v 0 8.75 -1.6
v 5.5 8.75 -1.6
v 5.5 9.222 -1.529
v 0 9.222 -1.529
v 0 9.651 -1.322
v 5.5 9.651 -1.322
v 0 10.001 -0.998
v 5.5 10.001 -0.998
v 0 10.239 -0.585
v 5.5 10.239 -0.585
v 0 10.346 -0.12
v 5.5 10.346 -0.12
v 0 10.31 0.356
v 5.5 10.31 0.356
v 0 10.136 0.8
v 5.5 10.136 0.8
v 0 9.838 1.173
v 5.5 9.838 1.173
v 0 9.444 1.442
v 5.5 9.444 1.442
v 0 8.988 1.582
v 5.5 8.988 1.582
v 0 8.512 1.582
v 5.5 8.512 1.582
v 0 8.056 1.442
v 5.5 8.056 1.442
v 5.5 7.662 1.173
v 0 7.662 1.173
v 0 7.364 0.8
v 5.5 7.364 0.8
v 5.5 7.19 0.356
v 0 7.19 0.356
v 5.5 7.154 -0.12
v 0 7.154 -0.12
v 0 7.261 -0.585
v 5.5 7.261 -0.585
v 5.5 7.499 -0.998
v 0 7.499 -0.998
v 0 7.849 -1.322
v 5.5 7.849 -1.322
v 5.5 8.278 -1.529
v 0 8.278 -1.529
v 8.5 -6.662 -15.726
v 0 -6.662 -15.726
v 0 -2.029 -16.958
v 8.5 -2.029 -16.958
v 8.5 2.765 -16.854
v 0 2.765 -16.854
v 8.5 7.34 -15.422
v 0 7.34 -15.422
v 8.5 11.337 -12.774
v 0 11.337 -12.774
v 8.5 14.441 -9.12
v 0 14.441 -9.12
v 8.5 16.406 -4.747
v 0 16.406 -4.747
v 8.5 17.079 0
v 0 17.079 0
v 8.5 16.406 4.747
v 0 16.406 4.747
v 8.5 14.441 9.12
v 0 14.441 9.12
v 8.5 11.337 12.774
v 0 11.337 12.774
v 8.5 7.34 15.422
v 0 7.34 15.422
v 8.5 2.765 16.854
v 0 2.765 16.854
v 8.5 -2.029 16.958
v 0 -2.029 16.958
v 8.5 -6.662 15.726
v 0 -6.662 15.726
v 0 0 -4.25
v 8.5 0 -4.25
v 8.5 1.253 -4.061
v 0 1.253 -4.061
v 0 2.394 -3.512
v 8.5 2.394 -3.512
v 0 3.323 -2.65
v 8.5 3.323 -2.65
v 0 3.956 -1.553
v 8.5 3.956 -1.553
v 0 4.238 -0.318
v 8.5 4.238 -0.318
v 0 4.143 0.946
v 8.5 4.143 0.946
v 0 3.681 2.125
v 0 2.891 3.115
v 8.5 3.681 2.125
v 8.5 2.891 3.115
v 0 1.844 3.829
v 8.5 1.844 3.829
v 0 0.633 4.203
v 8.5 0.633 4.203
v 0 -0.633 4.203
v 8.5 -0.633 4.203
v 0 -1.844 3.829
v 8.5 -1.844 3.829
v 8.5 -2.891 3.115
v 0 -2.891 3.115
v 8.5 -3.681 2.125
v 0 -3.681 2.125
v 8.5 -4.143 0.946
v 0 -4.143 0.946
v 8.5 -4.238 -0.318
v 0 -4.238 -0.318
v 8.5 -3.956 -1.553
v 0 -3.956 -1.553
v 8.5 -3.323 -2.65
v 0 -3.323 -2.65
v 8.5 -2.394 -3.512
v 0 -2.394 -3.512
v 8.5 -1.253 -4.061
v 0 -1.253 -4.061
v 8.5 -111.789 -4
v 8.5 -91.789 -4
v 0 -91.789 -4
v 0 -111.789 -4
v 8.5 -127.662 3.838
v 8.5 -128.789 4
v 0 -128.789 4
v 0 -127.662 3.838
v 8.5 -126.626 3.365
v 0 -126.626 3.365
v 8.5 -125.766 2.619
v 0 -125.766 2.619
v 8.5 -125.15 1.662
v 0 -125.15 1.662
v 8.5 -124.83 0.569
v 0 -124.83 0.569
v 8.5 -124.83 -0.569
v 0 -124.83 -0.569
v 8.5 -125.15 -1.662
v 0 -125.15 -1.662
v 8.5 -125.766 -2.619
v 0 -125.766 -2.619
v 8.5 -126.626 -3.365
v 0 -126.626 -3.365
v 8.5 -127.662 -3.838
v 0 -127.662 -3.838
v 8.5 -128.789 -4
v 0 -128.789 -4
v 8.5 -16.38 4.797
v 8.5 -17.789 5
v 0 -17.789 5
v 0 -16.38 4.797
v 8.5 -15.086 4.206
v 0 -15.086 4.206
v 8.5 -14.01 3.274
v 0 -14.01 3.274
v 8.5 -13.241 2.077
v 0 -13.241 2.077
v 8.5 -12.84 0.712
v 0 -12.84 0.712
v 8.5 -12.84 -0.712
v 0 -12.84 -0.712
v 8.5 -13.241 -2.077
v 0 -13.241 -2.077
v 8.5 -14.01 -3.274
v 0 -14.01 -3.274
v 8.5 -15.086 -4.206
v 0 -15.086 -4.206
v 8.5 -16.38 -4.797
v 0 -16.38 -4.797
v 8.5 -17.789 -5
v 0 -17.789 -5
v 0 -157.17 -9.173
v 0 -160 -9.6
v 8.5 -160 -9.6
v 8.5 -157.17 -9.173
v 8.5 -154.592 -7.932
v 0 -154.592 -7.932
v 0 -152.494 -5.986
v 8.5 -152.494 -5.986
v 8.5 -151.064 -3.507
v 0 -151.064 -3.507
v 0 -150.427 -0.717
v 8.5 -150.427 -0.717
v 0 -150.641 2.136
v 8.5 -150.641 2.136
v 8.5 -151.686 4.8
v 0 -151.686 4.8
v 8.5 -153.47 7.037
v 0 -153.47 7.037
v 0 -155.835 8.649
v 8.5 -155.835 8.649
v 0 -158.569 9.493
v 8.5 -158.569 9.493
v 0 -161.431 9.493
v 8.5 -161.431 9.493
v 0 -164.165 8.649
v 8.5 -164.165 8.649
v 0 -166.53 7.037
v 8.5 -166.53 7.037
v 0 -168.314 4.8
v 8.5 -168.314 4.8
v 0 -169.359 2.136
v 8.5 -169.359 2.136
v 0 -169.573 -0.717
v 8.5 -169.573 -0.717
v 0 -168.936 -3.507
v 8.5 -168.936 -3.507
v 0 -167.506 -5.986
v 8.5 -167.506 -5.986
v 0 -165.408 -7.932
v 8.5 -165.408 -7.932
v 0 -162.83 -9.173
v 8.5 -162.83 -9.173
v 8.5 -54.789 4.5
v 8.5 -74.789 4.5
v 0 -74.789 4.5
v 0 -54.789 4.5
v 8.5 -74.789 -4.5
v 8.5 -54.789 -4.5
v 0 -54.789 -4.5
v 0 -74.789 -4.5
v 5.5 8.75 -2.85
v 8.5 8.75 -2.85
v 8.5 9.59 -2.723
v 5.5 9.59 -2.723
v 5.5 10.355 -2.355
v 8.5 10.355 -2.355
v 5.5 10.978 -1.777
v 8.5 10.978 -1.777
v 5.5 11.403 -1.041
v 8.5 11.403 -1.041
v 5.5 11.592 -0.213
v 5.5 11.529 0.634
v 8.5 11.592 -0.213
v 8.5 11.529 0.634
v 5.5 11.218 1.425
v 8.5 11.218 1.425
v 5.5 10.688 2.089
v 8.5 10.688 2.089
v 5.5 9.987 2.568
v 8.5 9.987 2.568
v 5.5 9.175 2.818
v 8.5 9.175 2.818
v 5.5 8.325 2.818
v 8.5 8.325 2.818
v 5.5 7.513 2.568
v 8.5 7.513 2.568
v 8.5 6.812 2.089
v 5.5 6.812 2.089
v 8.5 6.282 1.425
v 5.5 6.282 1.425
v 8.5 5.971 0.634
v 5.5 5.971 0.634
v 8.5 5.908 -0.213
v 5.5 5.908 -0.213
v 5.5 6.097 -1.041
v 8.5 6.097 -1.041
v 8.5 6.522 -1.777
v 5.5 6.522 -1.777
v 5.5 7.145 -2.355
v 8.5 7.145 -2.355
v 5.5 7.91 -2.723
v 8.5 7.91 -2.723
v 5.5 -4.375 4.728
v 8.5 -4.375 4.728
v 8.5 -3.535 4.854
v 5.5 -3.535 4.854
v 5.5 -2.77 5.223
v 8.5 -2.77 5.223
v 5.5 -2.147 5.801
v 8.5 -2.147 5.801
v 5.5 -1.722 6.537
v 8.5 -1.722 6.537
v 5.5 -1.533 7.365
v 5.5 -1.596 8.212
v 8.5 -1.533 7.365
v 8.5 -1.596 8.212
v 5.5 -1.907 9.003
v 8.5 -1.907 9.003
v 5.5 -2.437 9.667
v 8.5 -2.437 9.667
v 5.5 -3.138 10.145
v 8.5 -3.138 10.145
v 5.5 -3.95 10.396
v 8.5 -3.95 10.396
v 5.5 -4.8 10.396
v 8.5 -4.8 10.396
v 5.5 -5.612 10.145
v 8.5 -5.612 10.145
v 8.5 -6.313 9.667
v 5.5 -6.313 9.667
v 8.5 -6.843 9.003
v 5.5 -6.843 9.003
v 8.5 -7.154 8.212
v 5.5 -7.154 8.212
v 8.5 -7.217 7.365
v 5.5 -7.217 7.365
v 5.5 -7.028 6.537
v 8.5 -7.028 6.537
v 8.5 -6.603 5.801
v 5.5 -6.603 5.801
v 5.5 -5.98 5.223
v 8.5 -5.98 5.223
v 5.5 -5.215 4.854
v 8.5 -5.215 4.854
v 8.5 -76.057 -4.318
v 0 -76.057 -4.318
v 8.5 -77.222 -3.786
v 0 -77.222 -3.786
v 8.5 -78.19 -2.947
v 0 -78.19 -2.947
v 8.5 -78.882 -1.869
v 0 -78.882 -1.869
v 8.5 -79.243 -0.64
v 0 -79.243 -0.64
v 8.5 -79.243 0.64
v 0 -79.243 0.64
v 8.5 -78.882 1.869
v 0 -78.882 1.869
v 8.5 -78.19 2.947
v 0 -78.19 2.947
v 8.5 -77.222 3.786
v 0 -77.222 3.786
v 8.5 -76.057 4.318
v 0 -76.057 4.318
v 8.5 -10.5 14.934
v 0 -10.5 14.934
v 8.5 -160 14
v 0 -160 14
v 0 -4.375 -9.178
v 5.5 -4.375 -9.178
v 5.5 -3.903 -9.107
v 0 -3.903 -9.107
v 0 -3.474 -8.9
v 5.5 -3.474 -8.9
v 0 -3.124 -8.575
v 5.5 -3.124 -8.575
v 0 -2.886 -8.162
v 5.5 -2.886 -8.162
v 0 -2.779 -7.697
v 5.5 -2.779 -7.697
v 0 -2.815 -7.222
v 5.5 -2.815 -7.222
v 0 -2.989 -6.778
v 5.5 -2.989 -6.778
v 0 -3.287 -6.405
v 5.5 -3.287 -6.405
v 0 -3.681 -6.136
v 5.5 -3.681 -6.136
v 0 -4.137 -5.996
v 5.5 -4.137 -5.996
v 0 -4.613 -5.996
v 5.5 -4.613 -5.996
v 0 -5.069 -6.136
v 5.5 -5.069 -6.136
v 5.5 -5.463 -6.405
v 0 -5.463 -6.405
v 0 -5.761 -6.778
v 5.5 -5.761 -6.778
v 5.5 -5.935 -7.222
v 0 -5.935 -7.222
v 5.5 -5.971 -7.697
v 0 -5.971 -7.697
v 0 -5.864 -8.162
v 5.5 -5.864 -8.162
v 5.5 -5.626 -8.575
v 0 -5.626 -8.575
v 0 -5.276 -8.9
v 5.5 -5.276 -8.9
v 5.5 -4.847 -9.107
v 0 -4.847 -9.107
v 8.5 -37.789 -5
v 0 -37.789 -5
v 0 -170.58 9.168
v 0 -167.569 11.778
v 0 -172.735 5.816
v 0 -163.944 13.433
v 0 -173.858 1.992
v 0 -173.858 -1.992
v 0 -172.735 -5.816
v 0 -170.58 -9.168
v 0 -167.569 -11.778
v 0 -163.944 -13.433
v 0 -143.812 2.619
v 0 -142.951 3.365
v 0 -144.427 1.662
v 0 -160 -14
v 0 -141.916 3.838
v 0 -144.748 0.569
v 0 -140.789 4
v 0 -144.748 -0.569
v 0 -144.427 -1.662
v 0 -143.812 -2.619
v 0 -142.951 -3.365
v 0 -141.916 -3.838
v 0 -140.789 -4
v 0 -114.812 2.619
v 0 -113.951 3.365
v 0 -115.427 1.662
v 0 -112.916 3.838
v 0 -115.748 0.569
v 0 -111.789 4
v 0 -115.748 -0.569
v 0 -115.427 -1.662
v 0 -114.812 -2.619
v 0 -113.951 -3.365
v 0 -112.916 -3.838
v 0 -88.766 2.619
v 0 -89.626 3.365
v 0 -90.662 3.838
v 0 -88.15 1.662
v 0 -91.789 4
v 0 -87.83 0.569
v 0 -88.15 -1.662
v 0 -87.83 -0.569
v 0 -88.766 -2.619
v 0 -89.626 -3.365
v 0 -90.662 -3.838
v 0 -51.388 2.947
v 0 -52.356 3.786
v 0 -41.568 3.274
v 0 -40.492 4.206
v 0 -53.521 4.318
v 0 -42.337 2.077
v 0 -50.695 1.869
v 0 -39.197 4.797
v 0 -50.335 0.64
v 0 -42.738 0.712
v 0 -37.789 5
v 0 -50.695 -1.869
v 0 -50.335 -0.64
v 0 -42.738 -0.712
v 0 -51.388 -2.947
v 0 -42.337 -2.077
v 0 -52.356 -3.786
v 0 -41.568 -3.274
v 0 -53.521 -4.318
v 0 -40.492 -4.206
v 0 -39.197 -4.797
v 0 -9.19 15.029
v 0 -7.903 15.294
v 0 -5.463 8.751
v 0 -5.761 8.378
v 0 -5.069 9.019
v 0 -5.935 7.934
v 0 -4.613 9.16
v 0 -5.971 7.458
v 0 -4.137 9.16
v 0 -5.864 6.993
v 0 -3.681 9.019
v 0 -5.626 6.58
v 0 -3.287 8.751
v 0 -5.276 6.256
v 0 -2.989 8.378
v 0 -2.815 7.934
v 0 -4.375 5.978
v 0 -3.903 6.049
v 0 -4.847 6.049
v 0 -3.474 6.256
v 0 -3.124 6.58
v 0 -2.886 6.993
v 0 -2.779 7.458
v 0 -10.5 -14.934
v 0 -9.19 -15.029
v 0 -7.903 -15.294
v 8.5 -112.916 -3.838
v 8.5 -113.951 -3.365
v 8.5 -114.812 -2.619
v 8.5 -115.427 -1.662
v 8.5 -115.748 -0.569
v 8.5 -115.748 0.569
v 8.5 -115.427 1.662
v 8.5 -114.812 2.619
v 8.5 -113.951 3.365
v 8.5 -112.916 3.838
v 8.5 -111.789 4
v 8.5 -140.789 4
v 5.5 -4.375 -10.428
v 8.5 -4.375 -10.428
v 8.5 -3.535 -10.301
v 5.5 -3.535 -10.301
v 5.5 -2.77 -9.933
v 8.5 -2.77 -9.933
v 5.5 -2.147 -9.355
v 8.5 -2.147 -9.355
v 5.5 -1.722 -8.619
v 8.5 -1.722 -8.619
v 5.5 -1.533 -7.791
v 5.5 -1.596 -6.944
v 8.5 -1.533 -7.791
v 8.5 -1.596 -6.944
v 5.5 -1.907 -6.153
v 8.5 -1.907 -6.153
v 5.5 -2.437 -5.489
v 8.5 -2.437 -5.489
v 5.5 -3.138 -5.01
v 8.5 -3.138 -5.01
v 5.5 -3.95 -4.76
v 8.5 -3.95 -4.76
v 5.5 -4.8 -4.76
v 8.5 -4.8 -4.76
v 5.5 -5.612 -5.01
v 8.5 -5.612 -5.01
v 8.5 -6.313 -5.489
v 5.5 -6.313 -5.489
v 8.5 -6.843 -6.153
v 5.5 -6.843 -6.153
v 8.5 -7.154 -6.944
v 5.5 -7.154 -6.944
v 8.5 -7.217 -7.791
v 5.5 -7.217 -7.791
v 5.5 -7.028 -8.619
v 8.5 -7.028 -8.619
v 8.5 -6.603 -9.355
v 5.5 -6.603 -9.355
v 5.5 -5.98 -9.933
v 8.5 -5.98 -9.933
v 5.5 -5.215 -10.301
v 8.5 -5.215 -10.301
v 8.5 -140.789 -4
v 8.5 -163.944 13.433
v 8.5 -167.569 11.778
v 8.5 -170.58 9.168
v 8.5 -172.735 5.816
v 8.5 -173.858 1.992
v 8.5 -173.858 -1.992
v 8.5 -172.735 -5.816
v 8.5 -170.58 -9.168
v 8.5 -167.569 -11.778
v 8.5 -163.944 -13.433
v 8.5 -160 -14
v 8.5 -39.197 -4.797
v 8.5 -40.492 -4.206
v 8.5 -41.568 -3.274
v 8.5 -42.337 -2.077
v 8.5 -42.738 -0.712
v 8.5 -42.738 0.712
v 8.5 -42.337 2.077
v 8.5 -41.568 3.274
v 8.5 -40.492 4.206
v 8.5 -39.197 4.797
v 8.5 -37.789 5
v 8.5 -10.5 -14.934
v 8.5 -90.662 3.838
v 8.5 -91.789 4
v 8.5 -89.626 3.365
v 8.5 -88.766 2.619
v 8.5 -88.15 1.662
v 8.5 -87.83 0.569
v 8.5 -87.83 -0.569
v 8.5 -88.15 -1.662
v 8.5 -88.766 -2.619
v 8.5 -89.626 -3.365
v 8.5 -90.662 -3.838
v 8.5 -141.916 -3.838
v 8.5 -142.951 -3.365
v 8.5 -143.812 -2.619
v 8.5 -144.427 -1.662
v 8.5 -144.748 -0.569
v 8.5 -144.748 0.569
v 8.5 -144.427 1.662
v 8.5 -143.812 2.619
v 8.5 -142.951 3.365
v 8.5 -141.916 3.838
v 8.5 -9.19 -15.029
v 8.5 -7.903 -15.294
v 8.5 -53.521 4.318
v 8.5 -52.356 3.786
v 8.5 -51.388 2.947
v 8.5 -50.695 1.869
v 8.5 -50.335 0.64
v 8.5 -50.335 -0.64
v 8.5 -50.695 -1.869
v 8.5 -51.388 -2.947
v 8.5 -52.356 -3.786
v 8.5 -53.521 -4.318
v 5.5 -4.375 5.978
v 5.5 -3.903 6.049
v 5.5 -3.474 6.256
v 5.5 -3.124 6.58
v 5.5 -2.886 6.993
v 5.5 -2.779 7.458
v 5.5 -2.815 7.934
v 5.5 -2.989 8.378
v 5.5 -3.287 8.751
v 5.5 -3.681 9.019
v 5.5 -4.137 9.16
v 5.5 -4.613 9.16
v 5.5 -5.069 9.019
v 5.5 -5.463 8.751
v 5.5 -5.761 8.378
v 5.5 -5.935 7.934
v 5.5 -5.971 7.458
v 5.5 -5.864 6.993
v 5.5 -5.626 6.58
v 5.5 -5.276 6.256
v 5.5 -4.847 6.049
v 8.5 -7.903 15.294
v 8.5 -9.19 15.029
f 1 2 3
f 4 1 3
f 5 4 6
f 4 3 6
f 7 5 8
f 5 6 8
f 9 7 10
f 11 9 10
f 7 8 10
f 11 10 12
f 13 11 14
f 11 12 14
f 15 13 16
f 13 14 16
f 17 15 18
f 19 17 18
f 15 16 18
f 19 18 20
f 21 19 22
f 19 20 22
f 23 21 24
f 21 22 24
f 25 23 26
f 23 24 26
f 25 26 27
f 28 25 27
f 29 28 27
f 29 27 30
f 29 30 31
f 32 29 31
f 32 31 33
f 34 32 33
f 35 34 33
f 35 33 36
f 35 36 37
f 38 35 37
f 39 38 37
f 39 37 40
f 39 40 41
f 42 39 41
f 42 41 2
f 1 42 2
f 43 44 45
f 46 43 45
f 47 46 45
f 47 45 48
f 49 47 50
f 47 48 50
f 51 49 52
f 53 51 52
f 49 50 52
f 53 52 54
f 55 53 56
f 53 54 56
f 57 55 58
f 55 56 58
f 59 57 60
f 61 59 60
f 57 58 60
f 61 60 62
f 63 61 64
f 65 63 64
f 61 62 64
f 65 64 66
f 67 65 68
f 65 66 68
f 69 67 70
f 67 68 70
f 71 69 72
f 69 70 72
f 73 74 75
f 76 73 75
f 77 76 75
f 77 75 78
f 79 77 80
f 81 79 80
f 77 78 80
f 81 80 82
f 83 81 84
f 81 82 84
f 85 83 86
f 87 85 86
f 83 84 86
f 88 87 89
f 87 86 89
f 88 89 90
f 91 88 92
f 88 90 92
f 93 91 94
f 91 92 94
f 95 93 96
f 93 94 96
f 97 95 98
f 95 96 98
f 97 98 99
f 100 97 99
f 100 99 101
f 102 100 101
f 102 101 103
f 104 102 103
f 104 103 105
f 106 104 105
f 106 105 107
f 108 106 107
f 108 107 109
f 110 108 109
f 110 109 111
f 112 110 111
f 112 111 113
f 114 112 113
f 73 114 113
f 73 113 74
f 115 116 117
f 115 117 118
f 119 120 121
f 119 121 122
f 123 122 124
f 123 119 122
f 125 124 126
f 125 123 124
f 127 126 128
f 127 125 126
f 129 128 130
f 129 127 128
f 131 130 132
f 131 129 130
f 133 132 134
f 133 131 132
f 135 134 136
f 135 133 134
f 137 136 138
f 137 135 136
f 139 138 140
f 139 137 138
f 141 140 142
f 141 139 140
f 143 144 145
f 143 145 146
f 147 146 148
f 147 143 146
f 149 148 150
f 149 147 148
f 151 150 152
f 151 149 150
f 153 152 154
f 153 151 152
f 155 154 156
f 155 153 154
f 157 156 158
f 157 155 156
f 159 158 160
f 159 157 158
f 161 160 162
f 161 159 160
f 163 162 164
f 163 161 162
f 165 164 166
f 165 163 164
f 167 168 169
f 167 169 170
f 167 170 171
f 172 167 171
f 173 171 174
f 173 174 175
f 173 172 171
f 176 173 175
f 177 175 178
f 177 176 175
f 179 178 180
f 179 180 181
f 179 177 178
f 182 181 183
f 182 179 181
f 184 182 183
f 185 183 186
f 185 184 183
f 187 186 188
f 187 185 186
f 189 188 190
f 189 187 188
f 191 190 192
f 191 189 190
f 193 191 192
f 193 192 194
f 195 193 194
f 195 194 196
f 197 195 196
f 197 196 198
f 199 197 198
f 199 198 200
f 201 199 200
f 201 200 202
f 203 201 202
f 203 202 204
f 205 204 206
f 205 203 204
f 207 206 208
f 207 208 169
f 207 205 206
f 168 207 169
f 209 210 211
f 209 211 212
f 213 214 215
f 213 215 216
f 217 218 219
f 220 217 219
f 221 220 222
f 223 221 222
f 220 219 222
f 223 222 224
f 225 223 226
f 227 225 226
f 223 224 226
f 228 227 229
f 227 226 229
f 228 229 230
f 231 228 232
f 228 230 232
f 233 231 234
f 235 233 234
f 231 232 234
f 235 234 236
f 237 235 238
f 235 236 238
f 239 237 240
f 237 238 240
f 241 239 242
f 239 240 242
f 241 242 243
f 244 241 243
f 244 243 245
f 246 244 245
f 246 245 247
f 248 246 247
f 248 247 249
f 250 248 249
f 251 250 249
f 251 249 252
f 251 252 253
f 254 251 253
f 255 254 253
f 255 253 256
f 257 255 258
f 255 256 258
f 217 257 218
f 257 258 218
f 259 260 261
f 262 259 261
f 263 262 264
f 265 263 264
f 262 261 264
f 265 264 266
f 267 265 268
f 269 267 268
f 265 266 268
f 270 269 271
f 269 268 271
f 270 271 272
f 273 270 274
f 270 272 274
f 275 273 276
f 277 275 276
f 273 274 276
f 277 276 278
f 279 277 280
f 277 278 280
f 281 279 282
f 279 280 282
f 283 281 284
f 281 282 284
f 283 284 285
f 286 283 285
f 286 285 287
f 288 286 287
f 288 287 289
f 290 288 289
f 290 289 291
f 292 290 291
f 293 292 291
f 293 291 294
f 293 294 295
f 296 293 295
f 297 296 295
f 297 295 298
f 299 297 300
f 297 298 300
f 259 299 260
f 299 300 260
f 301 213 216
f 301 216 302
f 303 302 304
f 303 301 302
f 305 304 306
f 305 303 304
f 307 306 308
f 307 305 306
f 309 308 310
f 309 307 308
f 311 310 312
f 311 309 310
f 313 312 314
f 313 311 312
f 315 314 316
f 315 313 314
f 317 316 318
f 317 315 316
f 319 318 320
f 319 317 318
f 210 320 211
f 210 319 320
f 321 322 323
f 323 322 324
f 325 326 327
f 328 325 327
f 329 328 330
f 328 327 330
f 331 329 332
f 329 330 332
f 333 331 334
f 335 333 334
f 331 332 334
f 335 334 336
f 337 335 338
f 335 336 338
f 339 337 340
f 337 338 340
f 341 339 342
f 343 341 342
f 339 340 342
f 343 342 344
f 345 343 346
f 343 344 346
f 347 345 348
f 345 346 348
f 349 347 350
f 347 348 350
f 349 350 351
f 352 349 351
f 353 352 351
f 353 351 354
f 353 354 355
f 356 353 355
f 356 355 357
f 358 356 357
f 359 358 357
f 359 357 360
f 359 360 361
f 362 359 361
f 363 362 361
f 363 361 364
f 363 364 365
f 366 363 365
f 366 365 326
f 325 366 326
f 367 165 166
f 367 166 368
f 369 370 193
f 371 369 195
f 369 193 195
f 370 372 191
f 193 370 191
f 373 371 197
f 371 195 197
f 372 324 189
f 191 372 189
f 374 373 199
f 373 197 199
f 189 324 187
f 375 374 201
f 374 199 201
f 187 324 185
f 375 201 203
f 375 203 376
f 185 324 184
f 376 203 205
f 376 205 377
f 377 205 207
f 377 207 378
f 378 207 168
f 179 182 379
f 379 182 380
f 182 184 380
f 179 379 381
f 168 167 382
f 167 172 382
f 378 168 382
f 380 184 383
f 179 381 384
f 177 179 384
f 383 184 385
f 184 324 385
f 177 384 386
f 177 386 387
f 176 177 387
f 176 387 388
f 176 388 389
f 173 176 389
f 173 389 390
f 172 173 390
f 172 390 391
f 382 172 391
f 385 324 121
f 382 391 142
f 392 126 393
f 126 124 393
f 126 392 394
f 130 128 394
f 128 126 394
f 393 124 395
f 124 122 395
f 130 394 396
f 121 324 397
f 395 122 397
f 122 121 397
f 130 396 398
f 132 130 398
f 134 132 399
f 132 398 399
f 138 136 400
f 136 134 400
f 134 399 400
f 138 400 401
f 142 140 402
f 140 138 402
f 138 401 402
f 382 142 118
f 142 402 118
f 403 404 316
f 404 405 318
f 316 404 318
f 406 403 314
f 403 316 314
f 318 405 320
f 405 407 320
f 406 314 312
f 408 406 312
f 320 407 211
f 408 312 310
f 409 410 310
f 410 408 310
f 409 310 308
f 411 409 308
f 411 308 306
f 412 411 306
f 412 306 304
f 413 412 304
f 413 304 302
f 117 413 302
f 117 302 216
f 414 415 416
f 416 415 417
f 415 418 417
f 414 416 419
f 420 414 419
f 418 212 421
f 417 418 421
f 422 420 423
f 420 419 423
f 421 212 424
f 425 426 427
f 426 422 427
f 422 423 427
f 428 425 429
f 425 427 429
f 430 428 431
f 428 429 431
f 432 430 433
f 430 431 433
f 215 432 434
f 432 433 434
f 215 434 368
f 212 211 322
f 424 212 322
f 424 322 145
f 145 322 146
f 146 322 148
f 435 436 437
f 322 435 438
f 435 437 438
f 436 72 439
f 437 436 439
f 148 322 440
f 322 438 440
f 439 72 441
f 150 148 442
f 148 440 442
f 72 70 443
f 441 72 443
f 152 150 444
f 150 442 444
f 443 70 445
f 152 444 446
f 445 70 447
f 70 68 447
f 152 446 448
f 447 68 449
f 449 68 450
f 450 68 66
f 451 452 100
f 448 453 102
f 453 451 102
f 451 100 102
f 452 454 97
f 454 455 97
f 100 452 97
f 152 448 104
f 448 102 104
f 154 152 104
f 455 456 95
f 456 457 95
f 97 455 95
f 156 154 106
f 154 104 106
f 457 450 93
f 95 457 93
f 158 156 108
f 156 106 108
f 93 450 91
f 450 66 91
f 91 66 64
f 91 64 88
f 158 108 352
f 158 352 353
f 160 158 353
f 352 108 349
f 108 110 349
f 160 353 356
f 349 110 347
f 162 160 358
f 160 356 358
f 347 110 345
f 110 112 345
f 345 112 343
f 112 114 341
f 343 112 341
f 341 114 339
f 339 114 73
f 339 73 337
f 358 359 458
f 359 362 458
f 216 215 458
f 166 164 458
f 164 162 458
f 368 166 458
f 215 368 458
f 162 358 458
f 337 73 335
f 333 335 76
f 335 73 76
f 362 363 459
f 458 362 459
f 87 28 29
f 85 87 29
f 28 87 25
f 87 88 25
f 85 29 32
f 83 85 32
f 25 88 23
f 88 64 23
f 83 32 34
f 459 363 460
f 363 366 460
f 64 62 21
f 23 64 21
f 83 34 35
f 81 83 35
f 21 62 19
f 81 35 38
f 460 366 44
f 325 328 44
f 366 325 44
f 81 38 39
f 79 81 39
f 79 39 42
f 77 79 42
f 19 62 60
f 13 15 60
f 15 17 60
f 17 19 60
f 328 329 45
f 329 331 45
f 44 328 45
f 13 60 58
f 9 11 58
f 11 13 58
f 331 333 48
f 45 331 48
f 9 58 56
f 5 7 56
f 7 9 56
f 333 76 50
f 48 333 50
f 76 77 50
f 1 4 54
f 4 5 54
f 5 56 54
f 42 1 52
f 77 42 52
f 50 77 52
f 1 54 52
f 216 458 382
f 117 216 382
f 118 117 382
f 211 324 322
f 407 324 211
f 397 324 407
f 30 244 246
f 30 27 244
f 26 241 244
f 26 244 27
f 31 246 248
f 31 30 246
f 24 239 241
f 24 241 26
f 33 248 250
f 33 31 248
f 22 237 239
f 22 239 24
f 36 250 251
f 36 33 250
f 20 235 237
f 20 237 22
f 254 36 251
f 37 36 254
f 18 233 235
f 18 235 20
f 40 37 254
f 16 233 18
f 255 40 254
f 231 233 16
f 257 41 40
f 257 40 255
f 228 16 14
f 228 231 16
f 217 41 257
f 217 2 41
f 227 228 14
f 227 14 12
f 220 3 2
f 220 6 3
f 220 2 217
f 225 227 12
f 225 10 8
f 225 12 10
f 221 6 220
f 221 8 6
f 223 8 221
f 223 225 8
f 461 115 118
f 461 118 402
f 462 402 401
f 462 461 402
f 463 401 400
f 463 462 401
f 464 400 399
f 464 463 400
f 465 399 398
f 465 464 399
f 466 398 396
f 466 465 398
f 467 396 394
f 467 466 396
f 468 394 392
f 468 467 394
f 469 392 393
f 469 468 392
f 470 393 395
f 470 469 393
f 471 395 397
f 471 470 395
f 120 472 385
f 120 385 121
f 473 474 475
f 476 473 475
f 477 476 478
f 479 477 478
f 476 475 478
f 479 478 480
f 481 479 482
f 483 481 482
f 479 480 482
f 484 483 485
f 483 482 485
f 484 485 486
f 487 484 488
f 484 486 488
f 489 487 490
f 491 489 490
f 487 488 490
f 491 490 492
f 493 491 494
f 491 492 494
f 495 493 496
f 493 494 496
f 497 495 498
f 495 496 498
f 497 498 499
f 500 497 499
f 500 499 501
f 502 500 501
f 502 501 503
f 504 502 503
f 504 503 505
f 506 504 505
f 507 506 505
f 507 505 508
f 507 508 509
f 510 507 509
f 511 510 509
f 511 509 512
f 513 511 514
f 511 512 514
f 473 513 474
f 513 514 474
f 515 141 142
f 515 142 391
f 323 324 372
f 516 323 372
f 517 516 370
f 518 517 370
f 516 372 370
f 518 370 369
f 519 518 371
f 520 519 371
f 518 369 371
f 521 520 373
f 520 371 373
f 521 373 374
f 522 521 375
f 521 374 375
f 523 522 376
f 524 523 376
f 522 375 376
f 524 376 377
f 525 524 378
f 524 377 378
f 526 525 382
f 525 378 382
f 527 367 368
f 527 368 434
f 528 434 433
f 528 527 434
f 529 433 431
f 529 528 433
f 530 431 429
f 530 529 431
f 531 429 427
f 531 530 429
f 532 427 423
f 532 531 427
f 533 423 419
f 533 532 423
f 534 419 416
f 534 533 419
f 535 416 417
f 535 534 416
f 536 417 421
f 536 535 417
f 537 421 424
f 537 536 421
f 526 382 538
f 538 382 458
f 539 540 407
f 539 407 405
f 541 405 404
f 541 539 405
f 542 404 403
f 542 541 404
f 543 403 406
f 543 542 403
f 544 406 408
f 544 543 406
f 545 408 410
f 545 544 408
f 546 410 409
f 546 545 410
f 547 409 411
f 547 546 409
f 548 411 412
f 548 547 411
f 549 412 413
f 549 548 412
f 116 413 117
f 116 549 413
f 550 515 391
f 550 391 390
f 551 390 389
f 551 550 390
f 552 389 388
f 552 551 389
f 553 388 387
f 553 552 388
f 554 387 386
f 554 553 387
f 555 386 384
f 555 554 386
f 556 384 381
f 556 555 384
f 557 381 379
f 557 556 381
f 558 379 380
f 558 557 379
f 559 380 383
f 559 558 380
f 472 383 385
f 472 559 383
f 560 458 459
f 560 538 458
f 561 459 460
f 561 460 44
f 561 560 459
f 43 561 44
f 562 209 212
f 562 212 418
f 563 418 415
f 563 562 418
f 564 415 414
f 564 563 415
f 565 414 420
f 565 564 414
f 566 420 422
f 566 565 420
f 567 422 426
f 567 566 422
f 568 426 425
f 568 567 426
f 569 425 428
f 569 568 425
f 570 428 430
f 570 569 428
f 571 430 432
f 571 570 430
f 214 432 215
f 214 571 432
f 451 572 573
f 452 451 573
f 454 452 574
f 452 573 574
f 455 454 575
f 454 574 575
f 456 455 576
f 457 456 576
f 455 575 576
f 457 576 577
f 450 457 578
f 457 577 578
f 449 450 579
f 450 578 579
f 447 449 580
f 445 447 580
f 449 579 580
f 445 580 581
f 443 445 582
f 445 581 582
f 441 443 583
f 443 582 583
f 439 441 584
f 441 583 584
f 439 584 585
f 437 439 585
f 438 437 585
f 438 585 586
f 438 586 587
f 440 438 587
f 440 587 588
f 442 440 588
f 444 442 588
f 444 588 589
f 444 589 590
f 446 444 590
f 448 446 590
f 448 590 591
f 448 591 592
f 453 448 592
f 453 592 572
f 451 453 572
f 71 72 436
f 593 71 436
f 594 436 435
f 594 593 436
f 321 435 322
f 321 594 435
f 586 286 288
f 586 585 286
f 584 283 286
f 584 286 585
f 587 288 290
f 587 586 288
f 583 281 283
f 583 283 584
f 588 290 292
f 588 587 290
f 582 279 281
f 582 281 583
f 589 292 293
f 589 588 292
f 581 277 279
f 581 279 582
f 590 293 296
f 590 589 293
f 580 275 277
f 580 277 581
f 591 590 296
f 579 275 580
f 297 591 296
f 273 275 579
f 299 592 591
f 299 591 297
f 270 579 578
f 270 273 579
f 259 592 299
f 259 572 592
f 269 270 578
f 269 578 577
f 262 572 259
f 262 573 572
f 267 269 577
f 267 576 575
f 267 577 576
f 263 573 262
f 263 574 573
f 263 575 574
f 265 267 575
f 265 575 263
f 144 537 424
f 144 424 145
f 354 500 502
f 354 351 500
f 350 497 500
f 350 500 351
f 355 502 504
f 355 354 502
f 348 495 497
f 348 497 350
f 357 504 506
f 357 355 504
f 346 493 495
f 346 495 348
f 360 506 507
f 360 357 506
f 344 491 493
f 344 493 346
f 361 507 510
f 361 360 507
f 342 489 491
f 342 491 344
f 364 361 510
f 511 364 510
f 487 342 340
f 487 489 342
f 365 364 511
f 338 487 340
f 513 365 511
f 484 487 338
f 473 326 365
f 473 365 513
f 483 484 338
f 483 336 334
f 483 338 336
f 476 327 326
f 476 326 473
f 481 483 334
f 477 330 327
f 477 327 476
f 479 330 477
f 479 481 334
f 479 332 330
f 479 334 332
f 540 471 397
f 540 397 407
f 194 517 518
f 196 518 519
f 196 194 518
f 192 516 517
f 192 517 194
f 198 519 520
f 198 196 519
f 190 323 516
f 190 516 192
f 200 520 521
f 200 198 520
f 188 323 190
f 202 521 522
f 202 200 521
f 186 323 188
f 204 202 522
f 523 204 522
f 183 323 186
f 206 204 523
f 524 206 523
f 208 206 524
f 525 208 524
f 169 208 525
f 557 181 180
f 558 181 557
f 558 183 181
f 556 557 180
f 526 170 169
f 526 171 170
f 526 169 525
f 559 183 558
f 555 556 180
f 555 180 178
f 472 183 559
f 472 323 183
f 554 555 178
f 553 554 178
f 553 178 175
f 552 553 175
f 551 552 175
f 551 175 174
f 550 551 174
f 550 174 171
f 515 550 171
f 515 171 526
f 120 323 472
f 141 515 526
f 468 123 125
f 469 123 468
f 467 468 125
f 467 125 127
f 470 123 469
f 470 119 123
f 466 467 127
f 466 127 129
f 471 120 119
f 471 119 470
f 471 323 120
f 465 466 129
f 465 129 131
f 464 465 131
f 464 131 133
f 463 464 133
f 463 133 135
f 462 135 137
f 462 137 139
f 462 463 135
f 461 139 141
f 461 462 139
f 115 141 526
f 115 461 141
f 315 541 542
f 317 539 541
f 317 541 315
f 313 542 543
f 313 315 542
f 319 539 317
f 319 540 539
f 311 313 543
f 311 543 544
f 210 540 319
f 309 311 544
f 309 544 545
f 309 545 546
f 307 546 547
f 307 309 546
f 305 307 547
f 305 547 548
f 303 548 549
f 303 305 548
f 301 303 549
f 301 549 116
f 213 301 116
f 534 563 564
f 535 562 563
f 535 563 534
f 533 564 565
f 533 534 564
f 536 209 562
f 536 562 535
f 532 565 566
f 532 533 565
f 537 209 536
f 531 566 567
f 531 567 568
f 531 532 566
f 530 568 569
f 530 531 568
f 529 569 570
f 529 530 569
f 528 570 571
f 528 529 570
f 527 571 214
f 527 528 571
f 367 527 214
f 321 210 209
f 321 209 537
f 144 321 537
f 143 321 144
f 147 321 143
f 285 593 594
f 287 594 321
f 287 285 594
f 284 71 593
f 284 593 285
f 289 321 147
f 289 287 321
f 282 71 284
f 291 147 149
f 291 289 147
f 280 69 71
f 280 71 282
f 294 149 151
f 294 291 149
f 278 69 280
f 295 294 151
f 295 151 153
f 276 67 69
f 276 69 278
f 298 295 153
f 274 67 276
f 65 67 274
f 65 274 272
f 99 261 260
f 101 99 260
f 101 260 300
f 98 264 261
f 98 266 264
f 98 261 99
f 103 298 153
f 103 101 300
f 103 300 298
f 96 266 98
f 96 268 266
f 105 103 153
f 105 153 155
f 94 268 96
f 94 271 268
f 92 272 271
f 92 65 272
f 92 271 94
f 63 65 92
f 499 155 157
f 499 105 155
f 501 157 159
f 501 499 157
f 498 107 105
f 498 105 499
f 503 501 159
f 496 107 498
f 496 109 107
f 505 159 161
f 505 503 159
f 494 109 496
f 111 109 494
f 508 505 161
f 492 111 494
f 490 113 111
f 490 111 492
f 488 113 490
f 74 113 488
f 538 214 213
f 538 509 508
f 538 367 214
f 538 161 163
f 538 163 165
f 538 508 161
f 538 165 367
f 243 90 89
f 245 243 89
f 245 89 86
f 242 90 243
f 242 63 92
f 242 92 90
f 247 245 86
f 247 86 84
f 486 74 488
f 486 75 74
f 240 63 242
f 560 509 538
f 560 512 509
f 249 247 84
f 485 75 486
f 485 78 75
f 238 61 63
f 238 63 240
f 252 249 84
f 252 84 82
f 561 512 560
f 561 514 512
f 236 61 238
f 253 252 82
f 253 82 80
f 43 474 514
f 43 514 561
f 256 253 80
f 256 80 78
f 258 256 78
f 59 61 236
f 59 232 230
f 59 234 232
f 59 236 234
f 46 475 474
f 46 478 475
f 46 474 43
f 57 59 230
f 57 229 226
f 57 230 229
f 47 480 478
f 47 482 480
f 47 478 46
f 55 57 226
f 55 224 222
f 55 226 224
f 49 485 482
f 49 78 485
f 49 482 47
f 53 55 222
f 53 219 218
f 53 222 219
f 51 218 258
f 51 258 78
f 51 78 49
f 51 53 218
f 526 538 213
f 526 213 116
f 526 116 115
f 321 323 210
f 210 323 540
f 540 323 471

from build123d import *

# Parameters (mm, degrees)
SKETCH_3_R          = 9.6
EXTRUDE_1_DEPTH     = 8.5
SKETCH_4_R          = 4.25
SKETCH_4_R_2        = 1.6
CUT_EXTRUDE_1_DEPTH = 10
SKETCH_5_R          = 2.85
CUT_EXTRUDE_2_DEPTH = 3
CUT_EXTRUDE_3_DEPTH = 10
FILLET_1_R          = 10


with BuildPart() as part:
    # 草图3 → 凸台-拉伸1 (new body)
    with BuildSketch(Plane(origin=(0, 0, 0), x_dir=(0, 0, -1), z_dir=(1, 0, 0))):
        with BuildLine():
            Line((14, -160), (14.948368861, -8.260982254))
            ThreePointArc((14.948368861, -8.260982254), (0, 17.0791557), (-14.948368861, -8.260982254))
            Line((-14.948368861, -8.260982254), (-14, -160))
            ThreePointArc((-14, -160), (0, -174), (14, -160))
        make_face()
        with Locations((0, -160)):
            Circle(SKETCH_3_R, mode=Mode.SUBTRACT)
    extrude(amount=EXTRUDE_1_DEPTH)

    # 草图4 → 切除-拉伸1 (cut)
    with BuildSketch(Plane(origin=(8.5, 0, 0), x_dir=(0, 0, -1), z_dir=(1, 0, 0))):
        Circle(SKETCH_4_R)
        with Locations((0, 8.75)):
            Circle(SKETCH_4_R_2)
        with Locations((7.577722283, -4.375)):
            Circle(SKETCH_4_R_2)
        with Locations((-7.577722283, -4.375)):
            Circle(SKETCH_4_R_2)
    extrude(amount=-CUT_EXTRUDE_1_DEPTH, mode=Mode.SUBTRACT)

    # 草图5 → 切除-拉伸2 (cut)
    with BuildSketch(Plane(origin=(8.5, 0, 0), x_dir=(0, 0, -1), z_dir=(1, 0, 0))):
        with Locations((0, 8.75)):
            Circle(SKETCH_5_R)
        with Locations((7.577722283, -4.375)):
            Circle(SKETCH_5_R)
        with Locations((-7.577722283, -4.375)):
            Circle(SKETCH_5_R)
    extrude(amount=-CUT_EXTRUDE_2_DEPTH, mode=Mode.SUBTRACT)

    # 草图6 → 切除-拉伸3 (cut)
    with BuildSketch(Plane(origin=(8.5, 0, 0), x_dir=(0, 0, -1), z_dir=(1, 0, 0))):
        with BuildLine():
            Line((5, -17.788825977), (5, -37.788825977))
            ThreePointArc((5, -37.788825977), (0, -42.788825977), (-5, -37.788825977))
            Line((-5, -37.788825977), (-5, -17.788825977))
            ThreePointArc((-5, -17.788825977), (0, -12.788825977), (5, -17.788825977))
        make_face()
        with BuildLine():
            Line((4.5, -54.788825977), (4.5, -74.788825977))
            ThreePointArc((4.5, -74.788825977), (0, -79.288825977), (-4.5, -74.788825977))
            Line((-4.5, -74.788825977), (-4.5, -54.788825977))
            ThreePointArc((-4.5, -54.788825977), (0, -50.288825977), (4.5, -54.788825977))
        make_face()
        with BuildLine():
            Line((4, -91.788825977), (4, -111.788825977))
            ThreePointArc((4, -111.788825977), (0, -115.788825977), (-4, -111.788825977))
            Line((-4, -111.788825977), (-4, -91.788825977))
            ThreePointArc((-4, -91.788825977), (0, -87.788825977), (4, -91.788825977))
        make_face()
        with BuildLine():
            Line((4, -128.788825977), (4, -140.788825977))
            ThreePointArc((4, -140.788825977), (0, -144.788825977), (-4, -140.788825977))
            Line((-4, -140.788825977), (-4, -128.788825977))
            ThreePointArc((-4, -128.788825977), (0, -124.788825977), (4, -128.788825977))
        make_face()
    extrude(amount=-CUT_EXTRUDE_3_DEPTH, mode=Mode.SUBTRACT)

    # 圆角1
    fillet_1_edges = [part.edges().sort_by_distance(p)[0] for p in [
        (4.25, -8.260982254, 14.948368861),
        (4.25, -8.260982254, -14.948368861),
    ]]
    fillet(fillet_1_edges, radius=FILLET_1_R)


solid = part.part
